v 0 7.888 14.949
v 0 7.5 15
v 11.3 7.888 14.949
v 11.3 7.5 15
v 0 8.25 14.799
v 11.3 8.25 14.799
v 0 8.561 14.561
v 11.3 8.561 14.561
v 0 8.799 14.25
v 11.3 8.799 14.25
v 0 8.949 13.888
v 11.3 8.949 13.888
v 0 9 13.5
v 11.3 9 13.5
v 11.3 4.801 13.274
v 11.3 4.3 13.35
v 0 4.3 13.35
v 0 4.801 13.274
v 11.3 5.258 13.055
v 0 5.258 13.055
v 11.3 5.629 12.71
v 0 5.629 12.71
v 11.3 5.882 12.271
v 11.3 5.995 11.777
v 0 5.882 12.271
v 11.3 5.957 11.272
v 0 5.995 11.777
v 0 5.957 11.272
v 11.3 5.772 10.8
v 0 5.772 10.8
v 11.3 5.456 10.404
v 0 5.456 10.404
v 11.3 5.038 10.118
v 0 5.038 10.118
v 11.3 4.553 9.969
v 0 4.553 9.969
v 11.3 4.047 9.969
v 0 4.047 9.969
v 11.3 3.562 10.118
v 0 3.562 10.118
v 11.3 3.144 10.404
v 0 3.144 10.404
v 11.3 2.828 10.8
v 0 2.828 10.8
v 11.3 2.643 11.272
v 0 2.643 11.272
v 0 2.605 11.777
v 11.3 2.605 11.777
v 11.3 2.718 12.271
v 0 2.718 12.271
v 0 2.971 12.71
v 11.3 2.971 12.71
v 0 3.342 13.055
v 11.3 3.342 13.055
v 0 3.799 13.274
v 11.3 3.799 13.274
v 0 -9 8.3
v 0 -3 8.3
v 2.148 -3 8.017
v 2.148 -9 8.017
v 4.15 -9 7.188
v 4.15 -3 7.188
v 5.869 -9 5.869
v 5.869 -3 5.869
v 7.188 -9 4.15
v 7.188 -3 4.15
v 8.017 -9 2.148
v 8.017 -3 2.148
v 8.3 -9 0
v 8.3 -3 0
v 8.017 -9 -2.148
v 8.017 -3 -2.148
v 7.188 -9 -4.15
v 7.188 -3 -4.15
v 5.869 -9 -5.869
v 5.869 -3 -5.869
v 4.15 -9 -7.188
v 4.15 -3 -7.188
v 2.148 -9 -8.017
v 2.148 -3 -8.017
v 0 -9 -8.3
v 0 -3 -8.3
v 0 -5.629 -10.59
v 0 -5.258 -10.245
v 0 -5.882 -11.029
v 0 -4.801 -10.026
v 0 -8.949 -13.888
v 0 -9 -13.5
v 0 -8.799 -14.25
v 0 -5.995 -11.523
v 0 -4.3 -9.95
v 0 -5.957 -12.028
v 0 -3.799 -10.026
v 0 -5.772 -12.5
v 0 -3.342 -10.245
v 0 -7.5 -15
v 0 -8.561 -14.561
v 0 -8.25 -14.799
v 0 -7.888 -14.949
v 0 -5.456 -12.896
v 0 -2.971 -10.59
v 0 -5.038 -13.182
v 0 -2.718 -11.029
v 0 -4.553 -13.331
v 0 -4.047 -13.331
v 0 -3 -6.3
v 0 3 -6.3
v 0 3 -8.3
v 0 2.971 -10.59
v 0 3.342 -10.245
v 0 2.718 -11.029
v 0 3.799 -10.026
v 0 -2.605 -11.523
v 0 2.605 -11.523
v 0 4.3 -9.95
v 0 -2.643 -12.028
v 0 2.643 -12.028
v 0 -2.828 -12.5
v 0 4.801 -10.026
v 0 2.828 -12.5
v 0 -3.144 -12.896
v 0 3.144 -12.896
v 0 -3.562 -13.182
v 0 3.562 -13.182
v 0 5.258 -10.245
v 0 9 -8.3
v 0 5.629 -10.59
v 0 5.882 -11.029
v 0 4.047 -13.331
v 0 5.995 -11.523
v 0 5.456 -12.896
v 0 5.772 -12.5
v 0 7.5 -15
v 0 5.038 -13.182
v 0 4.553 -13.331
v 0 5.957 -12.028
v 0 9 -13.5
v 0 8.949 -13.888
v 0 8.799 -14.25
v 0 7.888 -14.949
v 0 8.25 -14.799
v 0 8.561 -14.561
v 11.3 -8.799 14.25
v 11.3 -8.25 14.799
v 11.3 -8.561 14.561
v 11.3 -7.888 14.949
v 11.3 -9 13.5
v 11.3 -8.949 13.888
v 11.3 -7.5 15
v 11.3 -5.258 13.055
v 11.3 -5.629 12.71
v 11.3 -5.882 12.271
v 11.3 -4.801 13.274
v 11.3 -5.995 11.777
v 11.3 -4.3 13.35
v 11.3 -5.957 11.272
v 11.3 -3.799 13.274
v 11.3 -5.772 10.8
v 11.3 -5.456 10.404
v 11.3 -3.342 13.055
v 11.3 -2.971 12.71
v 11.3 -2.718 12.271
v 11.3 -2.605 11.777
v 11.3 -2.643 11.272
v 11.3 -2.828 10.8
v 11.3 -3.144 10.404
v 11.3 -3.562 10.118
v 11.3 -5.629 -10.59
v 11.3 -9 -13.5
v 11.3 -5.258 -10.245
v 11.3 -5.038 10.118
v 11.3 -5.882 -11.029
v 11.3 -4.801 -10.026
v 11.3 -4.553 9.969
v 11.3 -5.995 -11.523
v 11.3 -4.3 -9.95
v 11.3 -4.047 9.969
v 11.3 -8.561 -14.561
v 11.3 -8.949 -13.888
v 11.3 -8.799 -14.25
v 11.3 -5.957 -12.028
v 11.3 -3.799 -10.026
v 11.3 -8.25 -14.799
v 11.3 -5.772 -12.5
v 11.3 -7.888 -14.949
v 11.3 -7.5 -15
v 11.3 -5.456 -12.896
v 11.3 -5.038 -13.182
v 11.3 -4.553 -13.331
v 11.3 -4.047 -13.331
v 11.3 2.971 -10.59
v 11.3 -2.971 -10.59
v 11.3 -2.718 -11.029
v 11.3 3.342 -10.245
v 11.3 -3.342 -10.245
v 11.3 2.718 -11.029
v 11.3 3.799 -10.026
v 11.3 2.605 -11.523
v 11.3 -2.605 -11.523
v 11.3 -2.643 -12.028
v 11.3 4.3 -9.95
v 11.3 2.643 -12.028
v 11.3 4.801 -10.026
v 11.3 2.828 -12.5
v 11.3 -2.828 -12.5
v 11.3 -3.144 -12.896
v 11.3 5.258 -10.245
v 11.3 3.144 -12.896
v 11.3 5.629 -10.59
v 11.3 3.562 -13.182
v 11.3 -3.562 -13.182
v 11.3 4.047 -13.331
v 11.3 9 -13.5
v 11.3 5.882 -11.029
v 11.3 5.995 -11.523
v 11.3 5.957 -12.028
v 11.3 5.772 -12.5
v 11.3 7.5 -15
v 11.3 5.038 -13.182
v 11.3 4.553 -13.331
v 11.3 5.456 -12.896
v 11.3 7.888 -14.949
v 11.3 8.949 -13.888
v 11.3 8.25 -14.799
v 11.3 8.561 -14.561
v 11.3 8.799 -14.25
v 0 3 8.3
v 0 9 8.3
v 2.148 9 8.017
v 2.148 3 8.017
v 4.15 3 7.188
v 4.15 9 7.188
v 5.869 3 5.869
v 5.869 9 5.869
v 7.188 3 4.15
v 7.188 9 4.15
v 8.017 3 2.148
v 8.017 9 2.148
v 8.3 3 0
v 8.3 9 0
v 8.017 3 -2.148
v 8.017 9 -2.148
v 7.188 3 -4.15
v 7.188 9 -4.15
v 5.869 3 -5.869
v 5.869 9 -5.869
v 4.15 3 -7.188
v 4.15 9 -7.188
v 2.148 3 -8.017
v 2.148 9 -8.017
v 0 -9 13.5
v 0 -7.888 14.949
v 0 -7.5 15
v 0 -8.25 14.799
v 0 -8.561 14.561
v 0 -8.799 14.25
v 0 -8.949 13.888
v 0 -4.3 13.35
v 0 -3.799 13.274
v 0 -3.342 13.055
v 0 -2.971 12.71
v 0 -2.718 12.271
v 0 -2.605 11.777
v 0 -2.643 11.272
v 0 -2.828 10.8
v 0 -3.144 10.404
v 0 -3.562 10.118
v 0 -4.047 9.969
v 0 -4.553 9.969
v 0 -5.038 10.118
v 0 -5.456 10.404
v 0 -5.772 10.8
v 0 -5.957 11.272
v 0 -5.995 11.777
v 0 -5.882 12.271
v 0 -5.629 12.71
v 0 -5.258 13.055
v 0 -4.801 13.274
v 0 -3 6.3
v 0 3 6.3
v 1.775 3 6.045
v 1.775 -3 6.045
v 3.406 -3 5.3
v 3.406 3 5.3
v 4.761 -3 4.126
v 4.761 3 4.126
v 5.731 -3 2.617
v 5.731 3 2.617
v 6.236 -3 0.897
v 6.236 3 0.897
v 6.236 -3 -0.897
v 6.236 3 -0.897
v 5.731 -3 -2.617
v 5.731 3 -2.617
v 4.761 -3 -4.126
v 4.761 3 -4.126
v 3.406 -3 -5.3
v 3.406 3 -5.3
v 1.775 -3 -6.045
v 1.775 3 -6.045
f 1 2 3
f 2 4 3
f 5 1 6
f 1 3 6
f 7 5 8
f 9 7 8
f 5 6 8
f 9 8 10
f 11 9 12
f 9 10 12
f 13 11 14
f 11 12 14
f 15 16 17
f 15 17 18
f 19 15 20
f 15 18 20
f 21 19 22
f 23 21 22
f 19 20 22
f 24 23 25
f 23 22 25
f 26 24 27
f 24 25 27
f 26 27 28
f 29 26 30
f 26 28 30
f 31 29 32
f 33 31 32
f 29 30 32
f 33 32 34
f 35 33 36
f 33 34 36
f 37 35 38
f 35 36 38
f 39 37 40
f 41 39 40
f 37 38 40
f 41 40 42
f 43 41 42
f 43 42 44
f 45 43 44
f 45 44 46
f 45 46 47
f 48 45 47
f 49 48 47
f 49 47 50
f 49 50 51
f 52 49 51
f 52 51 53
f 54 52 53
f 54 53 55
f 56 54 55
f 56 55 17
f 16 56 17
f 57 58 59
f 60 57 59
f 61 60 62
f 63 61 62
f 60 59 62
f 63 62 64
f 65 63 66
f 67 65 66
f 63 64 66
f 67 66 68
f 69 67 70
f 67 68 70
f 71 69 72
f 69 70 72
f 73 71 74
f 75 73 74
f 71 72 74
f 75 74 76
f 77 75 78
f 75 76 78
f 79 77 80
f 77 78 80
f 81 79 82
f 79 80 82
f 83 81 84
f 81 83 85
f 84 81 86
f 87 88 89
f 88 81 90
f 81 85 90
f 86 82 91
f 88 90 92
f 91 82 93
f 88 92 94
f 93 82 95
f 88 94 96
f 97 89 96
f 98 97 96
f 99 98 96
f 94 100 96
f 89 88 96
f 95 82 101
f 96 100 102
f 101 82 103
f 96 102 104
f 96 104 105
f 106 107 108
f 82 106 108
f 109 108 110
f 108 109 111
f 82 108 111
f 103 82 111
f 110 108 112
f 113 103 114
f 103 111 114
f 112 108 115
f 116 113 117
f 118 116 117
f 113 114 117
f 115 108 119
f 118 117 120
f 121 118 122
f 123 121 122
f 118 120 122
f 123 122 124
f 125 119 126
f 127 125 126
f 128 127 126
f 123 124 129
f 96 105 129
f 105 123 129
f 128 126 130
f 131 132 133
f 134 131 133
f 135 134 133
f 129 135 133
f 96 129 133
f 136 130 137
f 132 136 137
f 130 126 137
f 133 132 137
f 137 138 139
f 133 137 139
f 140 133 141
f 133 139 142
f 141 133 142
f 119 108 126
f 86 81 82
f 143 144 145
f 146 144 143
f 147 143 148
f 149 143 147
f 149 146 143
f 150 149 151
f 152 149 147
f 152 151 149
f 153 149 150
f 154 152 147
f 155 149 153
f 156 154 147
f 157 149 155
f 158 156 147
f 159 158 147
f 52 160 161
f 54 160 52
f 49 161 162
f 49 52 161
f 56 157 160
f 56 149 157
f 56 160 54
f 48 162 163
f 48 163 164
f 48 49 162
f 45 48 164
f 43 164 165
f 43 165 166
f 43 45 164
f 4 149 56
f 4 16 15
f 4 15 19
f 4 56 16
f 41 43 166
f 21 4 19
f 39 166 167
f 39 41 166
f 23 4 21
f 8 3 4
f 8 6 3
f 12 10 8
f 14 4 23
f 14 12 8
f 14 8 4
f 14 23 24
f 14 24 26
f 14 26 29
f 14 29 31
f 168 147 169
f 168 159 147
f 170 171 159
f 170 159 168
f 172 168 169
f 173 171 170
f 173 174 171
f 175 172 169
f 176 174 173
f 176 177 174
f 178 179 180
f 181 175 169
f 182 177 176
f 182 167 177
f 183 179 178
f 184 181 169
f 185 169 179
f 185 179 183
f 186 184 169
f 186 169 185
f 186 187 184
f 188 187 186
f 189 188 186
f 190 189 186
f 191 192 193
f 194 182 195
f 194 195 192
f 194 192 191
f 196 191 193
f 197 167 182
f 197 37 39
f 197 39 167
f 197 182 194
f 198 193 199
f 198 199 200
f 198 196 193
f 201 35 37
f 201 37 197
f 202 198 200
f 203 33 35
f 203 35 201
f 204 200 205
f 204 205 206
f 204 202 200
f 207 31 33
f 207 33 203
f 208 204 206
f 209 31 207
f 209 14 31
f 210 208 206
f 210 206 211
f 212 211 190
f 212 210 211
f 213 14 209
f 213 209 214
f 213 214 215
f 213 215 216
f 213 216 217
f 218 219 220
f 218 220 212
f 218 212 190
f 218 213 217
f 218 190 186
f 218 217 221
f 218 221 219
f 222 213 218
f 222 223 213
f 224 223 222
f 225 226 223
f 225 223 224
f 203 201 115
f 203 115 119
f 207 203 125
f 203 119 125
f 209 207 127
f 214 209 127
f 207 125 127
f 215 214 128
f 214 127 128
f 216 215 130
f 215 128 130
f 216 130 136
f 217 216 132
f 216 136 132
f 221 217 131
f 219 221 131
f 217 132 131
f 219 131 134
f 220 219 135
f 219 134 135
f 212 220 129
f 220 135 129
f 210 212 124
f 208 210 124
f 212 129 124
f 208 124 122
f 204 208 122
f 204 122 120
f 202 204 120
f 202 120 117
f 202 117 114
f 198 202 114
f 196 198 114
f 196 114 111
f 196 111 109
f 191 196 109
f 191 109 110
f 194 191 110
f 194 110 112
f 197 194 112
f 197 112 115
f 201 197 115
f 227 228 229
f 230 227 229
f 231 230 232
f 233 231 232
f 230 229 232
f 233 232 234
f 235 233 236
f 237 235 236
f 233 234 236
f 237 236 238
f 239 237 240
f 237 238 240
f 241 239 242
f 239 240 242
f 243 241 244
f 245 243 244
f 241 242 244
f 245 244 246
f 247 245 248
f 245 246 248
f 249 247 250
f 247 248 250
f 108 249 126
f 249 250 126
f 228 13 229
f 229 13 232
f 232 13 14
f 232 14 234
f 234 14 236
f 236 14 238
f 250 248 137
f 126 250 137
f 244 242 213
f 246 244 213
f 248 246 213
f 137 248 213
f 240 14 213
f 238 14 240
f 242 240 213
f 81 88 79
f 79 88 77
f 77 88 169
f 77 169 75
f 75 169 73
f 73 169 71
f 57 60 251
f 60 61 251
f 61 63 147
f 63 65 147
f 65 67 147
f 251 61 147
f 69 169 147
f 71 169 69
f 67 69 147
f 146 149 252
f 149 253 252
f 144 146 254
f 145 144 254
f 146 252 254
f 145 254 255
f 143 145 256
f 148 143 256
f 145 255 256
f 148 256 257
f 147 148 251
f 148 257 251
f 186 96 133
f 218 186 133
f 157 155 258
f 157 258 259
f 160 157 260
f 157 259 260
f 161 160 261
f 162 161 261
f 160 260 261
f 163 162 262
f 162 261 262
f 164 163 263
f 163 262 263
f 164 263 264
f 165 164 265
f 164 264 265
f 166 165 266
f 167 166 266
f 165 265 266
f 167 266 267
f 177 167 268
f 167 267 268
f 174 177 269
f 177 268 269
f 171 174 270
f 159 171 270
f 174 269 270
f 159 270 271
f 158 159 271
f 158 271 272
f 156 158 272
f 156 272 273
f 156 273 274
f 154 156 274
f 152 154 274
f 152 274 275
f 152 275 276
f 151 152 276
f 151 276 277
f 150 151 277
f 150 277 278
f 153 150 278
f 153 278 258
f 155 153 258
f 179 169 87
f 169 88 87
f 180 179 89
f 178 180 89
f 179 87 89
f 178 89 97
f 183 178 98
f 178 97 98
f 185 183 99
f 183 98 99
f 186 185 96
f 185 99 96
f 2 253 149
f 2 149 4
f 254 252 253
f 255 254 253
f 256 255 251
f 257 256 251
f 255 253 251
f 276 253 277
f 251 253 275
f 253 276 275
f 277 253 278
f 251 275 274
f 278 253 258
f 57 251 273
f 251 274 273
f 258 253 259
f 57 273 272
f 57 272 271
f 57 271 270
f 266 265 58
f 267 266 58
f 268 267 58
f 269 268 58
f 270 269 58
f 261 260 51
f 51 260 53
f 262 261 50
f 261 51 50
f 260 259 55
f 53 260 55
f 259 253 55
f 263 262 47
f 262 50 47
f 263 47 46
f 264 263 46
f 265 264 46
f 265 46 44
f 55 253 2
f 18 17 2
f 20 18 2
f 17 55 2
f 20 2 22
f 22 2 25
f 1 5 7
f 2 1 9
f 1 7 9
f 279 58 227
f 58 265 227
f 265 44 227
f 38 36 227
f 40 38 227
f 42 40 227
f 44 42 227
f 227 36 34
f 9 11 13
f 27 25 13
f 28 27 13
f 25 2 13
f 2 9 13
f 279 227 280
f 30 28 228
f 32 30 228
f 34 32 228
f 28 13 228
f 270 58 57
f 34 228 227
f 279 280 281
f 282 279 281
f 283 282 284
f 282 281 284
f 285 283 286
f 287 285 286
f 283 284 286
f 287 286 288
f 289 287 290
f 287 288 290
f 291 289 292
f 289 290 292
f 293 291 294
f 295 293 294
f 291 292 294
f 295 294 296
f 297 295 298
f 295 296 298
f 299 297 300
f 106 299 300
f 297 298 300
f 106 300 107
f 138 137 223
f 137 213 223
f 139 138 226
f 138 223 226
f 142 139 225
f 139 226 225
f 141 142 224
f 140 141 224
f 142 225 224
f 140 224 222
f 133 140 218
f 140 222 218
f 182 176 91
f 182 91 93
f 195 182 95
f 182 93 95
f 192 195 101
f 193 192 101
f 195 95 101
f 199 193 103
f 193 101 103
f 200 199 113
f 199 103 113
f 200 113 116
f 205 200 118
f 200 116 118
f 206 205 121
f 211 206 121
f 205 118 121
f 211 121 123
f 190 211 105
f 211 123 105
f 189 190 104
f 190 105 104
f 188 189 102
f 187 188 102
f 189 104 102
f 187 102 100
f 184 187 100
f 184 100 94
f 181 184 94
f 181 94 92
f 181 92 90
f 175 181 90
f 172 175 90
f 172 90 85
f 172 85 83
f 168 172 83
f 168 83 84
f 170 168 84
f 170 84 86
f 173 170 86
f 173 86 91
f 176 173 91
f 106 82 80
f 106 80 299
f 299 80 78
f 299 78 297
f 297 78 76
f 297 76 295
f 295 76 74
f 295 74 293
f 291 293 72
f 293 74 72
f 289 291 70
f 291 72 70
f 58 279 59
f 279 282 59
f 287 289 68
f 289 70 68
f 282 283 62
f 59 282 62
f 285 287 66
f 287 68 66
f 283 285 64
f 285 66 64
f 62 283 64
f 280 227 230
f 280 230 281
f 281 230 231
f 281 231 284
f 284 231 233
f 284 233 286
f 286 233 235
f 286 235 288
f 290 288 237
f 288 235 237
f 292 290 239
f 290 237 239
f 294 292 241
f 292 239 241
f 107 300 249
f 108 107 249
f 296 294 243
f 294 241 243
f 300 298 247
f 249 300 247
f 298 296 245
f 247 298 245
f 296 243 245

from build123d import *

# Parameters (mm, degrees)
SKETCH8_W           = 30
SKETCH8_H           = 100
BOSS_EXTRUDE1_DEPTH = 100
SKETCH9_W           = 88.7
SKETCH9_H           = 30
CUT_EXTRUDE1_DEPTH  = 103.708324882
SKETCH10_R          = 1.7
CUT_EXTRUDE2_DEPTH  = 21.825225089
FILLET1_R           = 1.5


with BuildPart() as part:
    # Sketch8 → Boss-Extrude1 (new body)
    with BuildSketch(Plane(origin=(0, 0, 0), x_dir=(0, 0, -1), z_dir=(1, 0, 0))):
        Rectangle(SKETCH8_W, SKETCH8_H)
    extrude(amount=BOSS_EXTRUDE1_DEPTH)

    # Sketch7 → Cut-Revolve3 (revolve, cut)
    with BuildSketch(Plane(origin=(0, 0, 0), x_dir=(0, 0, -1), z_dir=(1, 0, 0))):
        Polygon((-8.3, 9), (-150, 9), (-150, 50), (0, 50), (0, -50), (-150, -50), (-150, -9), (-8.3, -9), (-8.3, -3), (-6.3, -3), (-6.3, 3), (-8.3, 3), align=None)
    revolve(axis=Axis((0, -50, 0), (0, 1, 0)), mode=Mode.SUBTRACT)

    # Sketch9 → Cut-Extrude1 (cut, through all)
    with BuildSketch(Plane(origin=(0, 9, 0), x_dir=(1, 0, 0), z_dir=(0, 1, 0))):
        with Locations((55.65, 0)):
            Rectangle(SKETCH9_W, SKETCH9_H)
    extrude(amount=-CUT_EXTRUDE1_DEPTH, mode=Mode.SUBTRACT)

    # Sketch10 → Cut-Extrude2 (cut, through all)
    with BuildSketch(Plane.ZY):
        with Locations((-11.65, 4.3)):
            Circle(SKETCH10_R)
        with Locations((-11.65, -4.3)):
            Circle(SKETCH10_R)
        with Locations((11.65, -4.3)):
            Circle(SKETCH10_R)
        with Locations((11.65, 4.3)):
            Circle(SKETCH10_R)
    extrude(amount=-CUT_EXTRUDE2_DEPTH, mode=Mode.SUBTRACT)

    # Fillet1
    fillet1_edges = [part.edges().sort_by_distance(p)[0] for p in [
        (5.65, 9, 15),
        (5.65, -9, -15),
        (5.65, -9, 15),
        (5.65, 9, -15),
    ]]
    fillet(fillet1_edges, radius=FILLET1_R)


solid = part.part
